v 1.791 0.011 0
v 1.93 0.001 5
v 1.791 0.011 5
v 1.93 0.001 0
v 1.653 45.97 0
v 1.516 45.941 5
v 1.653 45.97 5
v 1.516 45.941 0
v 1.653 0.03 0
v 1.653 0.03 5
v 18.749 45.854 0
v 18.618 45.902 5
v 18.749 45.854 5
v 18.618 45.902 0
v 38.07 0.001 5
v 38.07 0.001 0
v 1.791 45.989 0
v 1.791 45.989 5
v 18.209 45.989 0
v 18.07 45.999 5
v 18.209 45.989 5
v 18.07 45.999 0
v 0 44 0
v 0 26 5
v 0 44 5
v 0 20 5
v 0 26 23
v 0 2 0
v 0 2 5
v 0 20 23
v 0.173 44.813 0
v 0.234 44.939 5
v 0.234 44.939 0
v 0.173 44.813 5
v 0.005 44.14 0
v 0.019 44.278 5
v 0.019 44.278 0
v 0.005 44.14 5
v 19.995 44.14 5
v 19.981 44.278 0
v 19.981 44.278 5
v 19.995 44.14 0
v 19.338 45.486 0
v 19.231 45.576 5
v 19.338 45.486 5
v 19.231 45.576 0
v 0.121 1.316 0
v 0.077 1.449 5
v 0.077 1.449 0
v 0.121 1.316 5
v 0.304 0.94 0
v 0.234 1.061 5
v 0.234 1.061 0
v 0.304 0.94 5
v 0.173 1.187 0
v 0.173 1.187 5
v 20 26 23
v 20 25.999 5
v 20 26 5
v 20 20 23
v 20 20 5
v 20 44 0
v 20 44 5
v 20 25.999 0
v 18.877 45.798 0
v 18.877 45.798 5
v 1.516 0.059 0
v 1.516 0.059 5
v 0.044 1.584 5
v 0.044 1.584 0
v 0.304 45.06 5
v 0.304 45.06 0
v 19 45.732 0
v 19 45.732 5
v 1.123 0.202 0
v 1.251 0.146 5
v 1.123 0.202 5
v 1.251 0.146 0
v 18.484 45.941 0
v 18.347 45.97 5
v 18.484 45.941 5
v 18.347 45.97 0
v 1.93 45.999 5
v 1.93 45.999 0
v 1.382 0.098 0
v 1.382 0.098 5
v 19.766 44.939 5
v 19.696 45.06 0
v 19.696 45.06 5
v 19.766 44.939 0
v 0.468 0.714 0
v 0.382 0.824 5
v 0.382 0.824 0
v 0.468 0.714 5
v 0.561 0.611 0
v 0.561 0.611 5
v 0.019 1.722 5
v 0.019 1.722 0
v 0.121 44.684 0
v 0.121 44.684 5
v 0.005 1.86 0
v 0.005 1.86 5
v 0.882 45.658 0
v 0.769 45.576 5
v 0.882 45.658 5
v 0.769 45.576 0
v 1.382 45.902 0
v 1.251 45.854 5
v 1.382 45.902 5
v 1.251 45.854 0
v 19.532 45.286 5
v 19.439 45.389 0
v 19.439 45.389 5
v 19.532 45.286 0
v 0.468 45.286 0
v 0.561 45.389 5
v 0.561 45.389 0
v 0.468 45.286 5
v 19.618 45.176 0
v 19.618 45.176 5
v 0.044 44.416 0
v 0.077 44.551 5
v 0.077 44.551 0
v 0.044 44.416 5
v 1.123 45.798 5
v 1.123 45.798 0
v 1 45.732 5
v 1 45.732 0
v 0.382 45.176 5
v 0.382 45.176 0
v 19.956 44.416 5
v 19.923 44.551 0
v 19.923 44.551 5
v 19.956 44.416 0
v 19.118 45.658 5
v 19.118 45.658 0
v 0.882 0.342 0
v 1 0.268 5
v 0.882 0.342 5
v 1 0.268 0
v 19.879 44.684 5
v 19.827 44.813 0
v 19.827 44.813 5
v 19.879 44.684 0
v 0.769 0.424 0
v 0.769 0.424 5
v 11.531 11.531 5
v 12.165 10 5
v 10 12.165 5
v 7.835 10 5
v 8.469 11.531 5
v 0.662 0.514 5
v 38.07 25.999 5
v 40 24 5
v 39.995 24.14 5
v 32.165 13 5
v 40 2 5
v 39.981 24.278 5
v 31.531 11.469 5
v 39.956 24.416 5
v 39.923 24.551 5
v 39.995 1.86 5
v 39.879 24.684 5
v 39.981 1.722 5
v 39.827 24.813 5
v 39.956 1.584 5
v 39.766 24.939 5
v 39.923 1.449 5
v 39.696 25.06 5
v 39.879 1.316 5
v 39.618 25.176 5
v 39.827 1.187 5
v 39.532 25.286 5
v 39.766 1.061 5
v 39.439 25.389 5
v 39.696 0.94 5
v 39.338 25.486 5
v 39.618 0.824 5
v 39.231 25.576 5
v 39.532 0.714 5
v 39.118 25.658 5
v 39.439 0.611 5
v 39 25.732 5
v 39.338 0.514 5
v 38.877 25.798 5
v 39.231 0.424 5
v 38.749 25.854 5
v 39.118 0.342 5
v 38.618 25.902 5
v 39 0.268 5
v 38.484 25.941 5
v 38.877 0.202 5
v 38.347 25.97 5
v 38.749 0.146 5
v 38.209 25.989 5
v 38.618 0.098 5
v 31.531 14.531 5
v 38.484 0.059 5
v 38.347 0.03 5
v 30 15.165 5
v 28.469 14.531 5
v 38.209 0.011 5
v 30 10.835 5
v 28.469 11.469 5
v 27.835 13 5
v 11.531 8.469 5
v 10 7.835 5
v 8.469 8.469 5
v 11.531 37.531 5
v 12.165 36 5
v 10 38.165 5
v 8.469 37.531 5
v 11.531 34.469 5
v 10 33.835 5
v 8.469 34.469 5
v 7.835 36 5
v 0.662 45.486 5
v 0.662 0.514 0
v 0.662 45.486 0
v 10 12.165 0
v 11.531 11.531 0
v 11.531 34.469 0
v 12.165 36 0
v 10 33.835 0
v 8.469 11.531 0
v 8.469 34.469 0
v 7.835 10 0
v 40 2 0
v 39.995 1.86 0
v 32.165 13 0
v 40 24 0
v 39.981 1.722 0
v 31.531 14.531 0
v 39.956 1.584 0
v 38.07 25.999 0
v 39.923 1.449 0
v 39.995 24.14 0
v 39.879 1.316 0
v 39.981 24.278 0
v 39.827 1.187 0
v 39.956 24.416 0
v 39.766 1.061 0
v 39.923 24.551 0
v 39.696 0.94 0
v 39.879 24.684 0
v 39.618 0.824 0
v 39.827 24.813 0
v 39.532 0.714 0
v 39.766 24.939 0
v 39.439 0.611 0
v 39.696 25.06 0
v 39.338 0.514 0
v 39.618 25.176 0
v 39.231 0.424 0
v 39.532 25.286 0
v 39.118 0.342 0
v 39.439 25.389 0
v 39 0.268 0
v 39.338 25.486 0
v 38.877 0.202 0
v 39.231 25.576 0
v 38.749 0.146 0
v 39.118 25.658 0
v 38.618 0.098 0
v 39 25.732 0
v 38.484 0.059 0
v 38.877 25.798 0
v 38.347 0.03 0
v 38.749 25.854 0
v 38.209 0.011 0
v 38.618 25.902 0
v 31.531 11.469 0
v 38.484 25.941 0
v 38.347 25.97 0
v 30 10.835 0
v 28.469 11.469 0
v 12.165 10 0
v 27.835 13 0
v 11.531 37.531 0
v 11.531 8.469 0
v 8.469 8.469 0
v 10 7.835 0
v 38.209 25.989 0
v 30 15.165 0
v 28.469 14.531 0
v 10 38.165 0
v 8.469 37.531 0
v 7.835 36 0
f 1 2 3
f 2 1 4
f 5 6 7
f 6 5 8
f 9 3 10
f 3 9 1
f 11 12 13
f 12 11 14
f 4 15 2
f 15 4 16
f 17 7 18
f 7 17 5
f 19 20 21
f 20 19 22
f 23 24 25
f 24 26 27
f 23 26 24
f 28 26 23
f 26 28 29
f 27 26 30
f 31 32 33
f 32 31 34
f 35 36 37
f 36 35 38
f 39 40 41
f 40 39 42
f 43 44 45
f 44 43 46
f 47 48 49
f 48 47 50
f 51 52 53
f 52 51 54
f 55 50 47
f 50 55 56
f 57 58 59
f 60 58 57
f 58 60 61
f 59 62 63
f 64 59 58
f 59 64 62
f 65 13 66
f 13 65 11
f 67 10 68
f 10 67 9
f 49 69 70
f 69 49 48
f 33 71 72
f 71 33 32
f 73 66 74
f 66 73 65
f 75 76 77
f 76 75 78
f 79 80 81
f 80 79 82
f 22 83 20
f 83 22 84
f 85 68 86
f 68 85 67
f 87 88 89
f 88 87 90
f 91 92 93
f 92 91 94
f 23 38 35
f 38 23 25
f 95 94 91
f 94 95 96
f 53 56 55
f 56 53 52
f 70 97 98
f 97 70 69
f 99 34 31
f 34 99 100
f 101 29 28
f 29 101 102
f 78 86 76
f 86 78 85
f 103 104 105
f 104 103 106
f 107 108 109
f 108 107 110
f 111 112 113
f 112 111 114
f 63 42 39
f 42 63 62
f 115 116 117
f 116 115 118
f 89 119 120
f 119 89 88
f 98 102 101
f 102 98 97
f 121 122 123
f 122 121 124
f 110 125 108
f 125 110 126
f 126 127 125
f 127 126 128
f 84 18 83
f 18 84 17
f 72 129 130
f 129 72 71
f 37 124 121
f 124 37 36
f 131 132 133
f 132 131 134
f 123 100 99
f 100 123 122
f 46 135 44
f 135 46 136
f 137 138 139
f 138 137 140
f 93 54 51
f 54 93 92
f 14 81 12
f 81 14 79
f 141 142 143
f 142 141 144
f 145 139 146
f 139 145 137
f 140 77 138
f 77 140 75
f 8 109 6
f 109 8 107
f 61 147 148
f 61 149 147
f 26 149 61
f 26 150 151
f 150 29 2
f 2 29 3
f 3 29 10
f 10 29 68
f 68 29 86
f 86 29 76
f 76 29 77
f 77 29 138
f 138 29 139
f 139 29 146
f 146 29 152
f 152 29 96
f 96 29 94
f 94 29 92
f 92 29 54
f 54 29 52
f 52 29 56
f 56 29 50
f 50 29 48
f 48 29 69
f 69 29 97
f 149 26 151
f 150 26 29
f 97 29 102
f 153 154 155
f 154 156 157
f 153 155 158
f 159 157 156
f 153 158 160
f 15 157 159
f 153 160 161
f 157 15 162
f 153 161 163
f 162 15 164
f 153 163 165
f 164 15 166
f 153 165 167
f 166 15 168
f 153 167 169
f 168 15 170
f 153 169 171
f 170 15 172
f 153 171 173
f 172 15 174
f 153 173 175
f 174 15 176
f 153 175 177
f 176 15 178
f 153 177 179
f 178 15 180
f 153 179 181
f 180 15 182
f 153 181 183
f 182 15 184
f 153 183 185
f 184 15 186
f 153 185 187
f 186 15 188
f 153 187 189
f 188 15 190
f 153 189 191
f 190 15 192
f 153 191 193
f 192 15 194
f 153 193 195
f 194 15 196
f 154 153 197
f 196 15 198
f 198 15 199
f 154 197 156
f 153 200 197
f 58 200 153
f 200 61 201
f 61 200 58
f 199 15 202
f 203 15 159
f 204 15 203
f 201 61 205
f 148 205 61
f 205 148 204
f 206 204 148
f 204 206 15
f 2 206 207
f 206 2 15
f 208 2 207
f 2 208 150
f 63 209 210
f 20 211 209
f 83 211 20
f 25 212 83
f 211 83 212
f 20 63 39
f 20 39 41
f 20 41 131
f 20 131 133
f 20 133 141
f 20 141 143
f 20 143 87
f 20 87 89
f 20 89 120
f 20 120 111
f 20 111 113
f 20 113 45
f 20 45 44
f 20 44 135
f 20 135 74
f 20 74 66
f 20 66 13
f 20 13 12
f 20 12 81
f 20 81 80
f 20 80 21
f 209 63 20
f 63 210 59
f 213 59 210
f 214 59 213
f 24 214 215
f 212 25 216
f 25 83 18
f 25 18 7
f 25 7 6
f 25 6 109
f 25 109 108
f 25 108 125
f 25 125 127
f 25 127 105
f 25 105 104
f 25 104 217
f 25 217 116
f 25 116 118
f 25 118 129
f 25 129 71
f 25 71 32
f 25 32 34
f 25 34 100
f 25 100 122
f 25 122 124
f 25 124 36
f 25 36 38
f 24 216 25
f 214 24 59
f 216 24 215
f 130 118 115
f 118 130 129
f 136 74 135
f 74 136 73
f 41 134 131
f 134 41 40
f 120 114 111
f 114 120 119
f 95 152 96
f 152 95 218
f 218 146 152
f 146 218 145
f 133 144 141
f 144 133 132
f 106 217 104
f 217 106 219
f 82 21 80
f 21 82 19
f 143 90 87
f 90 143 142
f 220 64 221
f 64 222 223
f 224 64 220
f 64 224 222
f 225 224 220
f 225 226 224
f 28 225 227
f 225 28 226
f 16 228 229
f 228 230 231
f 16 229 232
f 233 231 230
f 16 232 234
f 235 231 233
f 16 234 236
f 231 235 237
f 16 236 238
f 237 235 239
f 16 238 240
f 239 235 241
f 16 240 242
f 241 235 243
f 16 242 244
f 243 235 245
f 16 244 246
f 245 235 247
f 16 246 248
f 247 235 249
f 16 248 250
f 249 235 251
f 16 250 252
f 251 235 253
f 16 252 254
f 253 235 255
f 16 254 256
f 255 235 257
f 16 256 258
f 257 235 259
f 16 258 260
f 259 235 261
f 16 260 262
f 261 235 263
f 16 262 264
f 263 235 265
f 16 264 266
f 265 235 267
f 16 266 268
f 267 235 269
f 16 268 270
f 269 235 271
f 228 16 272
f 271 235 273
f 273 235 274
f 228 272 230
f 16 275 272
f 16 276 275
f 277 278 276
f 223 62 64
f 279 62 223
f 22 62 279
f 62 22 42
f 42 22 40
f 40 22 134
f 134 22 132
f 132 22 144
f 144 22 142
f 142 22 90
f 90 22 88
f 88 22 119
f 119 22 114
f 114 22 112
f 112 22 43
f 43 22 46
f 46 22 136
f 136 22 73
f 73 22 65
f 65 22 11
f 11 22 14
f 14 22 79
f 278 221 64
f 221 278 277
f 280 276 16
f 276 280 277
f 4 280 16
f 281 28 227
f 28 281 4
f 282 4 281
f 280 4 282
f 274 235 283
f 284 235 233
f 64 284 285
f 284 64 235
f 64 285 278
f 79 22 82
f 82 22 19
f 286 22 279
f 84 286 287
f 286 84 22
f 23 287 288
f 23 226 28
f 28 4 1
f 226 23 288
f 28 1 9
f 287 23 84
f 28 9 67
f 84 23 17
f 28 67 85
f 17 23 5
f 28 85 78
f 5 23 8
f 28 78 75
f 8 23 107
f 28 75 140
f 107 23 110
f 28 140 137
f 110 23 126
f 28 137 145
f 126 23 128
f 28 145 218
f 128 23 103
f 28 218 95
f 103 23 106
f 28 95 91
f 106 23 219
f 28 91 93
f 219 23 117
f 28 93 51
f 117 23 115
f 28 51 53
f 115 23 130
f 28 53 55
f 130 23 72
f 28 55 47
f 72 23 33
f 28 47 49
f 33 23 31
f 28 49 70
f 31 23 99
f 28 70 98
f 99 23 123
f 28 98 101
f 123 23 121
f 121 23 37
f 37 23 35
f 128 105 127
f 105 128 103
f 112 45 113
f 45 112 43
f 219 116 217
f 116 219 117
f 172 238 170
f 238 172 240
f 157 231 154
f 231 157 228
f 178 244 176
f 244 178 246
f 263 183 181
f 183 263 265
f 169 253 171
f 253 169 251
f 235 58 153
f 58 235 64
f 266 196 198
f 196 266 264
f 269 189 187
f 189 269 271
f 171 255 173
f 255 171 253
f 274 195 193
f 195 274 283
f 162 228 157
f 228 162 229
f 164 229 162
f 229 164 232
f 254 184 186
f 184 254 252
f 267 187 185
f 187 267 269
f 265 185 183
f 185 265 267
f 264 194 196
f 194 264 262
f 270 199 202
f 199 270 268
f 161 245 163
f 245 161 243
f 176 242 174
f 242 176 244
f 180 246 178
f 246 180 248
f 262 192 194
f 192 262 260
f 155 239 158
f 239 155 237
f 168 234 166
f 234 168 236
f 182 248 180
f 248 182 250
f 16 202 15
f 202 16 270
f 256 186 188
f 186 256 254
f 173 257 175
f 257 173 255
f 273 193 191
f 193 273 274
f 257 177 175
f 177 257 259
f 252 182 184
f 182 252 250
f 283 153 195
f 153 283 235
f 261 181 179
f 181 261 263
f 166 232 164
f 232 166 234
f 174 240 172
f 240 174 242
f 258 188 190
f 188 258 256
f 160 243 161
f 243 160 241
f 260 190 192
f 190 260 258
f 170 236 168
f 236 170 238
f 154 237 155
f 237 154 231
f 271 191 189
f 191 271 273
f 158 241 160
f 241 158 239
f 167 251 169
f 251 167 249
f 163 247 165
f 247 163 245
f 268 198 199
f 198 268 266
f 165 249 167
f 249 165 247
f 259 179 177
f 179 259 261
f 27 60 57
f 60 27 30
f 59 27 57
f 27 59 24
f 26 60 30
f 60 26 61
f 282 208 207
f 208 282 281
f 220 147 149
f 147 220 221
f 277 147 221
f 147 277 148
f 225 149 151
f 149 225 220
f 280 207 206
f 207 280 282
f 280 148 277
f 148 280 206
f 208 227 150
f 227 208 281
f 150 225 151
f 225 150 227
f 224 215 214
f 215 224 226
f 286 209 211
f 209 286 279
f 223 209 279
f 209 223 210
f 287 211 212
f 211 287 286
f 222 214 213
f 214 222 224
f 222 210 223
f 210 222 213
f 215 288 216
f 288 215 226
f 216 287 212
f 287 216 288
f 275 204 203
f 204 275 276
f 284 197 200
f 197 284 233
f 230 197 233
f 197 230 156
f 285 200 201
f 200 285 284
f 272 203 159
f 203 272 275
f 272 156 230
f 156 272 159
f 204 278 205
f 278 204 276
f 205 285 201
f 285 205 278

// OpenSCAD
// file: polyhole.scad
// The Cylinder is dead! Long live the Cylinder!
// A module for a polyhole by radius, based on Nophead's work.

module polyhole(h, r, cent = false)
{
    n = max(round(4 * r), 3);
    cylinder(h = h, r = r / cos(180 / n), $fn = n, center = cent);
}
// main file
// L bracket 

use<polyhole.scad>

LBracket();

module LBracket()
{
    difference()
    {
        union()
        {
            hull()
            {
                translate([2, 2, 0])
                    cylinder(h = 5, r = 2, $fn = 90);
                translate([2, 46-2, 0])
                    cylinder(h = 5, r = 2, $fn = 90);
                translate([20-2, 2, 0])
                    cylinder(h = 5, r = 2, $fn = 90);
                translate([20-2, 46-2, 0])
                    cylinder(h = 5, r = 2, $fn = 90);
            }
            hull()
            {
                translate([2, 2, 0])
                    cylinder(h = 5, r = 2, $fn = 90);
                translate([2, 26-2, 0])
                    cylinder(h = 5, r = 2, $fn = 90);
                translate([40-2, 2, 0])
                    cylinder(h = 5, r = 2, $fn = 90);
                translate([40-2, 26-2, 0])
                    cylinder(h = 5, r = 2, $fn = 90);
            }
            translate([10, 23, (5+18)/2])
                cube([20, 6, 5+18], center = true);
        }
        translate([10, 10, 0])
            polyhole(5, 2);
        translate([10, 46-10, 0])
            polyhole(5, 2);
        translate([40-10, 26/2, 0])
            polyhole(5, 2);
    }
}
